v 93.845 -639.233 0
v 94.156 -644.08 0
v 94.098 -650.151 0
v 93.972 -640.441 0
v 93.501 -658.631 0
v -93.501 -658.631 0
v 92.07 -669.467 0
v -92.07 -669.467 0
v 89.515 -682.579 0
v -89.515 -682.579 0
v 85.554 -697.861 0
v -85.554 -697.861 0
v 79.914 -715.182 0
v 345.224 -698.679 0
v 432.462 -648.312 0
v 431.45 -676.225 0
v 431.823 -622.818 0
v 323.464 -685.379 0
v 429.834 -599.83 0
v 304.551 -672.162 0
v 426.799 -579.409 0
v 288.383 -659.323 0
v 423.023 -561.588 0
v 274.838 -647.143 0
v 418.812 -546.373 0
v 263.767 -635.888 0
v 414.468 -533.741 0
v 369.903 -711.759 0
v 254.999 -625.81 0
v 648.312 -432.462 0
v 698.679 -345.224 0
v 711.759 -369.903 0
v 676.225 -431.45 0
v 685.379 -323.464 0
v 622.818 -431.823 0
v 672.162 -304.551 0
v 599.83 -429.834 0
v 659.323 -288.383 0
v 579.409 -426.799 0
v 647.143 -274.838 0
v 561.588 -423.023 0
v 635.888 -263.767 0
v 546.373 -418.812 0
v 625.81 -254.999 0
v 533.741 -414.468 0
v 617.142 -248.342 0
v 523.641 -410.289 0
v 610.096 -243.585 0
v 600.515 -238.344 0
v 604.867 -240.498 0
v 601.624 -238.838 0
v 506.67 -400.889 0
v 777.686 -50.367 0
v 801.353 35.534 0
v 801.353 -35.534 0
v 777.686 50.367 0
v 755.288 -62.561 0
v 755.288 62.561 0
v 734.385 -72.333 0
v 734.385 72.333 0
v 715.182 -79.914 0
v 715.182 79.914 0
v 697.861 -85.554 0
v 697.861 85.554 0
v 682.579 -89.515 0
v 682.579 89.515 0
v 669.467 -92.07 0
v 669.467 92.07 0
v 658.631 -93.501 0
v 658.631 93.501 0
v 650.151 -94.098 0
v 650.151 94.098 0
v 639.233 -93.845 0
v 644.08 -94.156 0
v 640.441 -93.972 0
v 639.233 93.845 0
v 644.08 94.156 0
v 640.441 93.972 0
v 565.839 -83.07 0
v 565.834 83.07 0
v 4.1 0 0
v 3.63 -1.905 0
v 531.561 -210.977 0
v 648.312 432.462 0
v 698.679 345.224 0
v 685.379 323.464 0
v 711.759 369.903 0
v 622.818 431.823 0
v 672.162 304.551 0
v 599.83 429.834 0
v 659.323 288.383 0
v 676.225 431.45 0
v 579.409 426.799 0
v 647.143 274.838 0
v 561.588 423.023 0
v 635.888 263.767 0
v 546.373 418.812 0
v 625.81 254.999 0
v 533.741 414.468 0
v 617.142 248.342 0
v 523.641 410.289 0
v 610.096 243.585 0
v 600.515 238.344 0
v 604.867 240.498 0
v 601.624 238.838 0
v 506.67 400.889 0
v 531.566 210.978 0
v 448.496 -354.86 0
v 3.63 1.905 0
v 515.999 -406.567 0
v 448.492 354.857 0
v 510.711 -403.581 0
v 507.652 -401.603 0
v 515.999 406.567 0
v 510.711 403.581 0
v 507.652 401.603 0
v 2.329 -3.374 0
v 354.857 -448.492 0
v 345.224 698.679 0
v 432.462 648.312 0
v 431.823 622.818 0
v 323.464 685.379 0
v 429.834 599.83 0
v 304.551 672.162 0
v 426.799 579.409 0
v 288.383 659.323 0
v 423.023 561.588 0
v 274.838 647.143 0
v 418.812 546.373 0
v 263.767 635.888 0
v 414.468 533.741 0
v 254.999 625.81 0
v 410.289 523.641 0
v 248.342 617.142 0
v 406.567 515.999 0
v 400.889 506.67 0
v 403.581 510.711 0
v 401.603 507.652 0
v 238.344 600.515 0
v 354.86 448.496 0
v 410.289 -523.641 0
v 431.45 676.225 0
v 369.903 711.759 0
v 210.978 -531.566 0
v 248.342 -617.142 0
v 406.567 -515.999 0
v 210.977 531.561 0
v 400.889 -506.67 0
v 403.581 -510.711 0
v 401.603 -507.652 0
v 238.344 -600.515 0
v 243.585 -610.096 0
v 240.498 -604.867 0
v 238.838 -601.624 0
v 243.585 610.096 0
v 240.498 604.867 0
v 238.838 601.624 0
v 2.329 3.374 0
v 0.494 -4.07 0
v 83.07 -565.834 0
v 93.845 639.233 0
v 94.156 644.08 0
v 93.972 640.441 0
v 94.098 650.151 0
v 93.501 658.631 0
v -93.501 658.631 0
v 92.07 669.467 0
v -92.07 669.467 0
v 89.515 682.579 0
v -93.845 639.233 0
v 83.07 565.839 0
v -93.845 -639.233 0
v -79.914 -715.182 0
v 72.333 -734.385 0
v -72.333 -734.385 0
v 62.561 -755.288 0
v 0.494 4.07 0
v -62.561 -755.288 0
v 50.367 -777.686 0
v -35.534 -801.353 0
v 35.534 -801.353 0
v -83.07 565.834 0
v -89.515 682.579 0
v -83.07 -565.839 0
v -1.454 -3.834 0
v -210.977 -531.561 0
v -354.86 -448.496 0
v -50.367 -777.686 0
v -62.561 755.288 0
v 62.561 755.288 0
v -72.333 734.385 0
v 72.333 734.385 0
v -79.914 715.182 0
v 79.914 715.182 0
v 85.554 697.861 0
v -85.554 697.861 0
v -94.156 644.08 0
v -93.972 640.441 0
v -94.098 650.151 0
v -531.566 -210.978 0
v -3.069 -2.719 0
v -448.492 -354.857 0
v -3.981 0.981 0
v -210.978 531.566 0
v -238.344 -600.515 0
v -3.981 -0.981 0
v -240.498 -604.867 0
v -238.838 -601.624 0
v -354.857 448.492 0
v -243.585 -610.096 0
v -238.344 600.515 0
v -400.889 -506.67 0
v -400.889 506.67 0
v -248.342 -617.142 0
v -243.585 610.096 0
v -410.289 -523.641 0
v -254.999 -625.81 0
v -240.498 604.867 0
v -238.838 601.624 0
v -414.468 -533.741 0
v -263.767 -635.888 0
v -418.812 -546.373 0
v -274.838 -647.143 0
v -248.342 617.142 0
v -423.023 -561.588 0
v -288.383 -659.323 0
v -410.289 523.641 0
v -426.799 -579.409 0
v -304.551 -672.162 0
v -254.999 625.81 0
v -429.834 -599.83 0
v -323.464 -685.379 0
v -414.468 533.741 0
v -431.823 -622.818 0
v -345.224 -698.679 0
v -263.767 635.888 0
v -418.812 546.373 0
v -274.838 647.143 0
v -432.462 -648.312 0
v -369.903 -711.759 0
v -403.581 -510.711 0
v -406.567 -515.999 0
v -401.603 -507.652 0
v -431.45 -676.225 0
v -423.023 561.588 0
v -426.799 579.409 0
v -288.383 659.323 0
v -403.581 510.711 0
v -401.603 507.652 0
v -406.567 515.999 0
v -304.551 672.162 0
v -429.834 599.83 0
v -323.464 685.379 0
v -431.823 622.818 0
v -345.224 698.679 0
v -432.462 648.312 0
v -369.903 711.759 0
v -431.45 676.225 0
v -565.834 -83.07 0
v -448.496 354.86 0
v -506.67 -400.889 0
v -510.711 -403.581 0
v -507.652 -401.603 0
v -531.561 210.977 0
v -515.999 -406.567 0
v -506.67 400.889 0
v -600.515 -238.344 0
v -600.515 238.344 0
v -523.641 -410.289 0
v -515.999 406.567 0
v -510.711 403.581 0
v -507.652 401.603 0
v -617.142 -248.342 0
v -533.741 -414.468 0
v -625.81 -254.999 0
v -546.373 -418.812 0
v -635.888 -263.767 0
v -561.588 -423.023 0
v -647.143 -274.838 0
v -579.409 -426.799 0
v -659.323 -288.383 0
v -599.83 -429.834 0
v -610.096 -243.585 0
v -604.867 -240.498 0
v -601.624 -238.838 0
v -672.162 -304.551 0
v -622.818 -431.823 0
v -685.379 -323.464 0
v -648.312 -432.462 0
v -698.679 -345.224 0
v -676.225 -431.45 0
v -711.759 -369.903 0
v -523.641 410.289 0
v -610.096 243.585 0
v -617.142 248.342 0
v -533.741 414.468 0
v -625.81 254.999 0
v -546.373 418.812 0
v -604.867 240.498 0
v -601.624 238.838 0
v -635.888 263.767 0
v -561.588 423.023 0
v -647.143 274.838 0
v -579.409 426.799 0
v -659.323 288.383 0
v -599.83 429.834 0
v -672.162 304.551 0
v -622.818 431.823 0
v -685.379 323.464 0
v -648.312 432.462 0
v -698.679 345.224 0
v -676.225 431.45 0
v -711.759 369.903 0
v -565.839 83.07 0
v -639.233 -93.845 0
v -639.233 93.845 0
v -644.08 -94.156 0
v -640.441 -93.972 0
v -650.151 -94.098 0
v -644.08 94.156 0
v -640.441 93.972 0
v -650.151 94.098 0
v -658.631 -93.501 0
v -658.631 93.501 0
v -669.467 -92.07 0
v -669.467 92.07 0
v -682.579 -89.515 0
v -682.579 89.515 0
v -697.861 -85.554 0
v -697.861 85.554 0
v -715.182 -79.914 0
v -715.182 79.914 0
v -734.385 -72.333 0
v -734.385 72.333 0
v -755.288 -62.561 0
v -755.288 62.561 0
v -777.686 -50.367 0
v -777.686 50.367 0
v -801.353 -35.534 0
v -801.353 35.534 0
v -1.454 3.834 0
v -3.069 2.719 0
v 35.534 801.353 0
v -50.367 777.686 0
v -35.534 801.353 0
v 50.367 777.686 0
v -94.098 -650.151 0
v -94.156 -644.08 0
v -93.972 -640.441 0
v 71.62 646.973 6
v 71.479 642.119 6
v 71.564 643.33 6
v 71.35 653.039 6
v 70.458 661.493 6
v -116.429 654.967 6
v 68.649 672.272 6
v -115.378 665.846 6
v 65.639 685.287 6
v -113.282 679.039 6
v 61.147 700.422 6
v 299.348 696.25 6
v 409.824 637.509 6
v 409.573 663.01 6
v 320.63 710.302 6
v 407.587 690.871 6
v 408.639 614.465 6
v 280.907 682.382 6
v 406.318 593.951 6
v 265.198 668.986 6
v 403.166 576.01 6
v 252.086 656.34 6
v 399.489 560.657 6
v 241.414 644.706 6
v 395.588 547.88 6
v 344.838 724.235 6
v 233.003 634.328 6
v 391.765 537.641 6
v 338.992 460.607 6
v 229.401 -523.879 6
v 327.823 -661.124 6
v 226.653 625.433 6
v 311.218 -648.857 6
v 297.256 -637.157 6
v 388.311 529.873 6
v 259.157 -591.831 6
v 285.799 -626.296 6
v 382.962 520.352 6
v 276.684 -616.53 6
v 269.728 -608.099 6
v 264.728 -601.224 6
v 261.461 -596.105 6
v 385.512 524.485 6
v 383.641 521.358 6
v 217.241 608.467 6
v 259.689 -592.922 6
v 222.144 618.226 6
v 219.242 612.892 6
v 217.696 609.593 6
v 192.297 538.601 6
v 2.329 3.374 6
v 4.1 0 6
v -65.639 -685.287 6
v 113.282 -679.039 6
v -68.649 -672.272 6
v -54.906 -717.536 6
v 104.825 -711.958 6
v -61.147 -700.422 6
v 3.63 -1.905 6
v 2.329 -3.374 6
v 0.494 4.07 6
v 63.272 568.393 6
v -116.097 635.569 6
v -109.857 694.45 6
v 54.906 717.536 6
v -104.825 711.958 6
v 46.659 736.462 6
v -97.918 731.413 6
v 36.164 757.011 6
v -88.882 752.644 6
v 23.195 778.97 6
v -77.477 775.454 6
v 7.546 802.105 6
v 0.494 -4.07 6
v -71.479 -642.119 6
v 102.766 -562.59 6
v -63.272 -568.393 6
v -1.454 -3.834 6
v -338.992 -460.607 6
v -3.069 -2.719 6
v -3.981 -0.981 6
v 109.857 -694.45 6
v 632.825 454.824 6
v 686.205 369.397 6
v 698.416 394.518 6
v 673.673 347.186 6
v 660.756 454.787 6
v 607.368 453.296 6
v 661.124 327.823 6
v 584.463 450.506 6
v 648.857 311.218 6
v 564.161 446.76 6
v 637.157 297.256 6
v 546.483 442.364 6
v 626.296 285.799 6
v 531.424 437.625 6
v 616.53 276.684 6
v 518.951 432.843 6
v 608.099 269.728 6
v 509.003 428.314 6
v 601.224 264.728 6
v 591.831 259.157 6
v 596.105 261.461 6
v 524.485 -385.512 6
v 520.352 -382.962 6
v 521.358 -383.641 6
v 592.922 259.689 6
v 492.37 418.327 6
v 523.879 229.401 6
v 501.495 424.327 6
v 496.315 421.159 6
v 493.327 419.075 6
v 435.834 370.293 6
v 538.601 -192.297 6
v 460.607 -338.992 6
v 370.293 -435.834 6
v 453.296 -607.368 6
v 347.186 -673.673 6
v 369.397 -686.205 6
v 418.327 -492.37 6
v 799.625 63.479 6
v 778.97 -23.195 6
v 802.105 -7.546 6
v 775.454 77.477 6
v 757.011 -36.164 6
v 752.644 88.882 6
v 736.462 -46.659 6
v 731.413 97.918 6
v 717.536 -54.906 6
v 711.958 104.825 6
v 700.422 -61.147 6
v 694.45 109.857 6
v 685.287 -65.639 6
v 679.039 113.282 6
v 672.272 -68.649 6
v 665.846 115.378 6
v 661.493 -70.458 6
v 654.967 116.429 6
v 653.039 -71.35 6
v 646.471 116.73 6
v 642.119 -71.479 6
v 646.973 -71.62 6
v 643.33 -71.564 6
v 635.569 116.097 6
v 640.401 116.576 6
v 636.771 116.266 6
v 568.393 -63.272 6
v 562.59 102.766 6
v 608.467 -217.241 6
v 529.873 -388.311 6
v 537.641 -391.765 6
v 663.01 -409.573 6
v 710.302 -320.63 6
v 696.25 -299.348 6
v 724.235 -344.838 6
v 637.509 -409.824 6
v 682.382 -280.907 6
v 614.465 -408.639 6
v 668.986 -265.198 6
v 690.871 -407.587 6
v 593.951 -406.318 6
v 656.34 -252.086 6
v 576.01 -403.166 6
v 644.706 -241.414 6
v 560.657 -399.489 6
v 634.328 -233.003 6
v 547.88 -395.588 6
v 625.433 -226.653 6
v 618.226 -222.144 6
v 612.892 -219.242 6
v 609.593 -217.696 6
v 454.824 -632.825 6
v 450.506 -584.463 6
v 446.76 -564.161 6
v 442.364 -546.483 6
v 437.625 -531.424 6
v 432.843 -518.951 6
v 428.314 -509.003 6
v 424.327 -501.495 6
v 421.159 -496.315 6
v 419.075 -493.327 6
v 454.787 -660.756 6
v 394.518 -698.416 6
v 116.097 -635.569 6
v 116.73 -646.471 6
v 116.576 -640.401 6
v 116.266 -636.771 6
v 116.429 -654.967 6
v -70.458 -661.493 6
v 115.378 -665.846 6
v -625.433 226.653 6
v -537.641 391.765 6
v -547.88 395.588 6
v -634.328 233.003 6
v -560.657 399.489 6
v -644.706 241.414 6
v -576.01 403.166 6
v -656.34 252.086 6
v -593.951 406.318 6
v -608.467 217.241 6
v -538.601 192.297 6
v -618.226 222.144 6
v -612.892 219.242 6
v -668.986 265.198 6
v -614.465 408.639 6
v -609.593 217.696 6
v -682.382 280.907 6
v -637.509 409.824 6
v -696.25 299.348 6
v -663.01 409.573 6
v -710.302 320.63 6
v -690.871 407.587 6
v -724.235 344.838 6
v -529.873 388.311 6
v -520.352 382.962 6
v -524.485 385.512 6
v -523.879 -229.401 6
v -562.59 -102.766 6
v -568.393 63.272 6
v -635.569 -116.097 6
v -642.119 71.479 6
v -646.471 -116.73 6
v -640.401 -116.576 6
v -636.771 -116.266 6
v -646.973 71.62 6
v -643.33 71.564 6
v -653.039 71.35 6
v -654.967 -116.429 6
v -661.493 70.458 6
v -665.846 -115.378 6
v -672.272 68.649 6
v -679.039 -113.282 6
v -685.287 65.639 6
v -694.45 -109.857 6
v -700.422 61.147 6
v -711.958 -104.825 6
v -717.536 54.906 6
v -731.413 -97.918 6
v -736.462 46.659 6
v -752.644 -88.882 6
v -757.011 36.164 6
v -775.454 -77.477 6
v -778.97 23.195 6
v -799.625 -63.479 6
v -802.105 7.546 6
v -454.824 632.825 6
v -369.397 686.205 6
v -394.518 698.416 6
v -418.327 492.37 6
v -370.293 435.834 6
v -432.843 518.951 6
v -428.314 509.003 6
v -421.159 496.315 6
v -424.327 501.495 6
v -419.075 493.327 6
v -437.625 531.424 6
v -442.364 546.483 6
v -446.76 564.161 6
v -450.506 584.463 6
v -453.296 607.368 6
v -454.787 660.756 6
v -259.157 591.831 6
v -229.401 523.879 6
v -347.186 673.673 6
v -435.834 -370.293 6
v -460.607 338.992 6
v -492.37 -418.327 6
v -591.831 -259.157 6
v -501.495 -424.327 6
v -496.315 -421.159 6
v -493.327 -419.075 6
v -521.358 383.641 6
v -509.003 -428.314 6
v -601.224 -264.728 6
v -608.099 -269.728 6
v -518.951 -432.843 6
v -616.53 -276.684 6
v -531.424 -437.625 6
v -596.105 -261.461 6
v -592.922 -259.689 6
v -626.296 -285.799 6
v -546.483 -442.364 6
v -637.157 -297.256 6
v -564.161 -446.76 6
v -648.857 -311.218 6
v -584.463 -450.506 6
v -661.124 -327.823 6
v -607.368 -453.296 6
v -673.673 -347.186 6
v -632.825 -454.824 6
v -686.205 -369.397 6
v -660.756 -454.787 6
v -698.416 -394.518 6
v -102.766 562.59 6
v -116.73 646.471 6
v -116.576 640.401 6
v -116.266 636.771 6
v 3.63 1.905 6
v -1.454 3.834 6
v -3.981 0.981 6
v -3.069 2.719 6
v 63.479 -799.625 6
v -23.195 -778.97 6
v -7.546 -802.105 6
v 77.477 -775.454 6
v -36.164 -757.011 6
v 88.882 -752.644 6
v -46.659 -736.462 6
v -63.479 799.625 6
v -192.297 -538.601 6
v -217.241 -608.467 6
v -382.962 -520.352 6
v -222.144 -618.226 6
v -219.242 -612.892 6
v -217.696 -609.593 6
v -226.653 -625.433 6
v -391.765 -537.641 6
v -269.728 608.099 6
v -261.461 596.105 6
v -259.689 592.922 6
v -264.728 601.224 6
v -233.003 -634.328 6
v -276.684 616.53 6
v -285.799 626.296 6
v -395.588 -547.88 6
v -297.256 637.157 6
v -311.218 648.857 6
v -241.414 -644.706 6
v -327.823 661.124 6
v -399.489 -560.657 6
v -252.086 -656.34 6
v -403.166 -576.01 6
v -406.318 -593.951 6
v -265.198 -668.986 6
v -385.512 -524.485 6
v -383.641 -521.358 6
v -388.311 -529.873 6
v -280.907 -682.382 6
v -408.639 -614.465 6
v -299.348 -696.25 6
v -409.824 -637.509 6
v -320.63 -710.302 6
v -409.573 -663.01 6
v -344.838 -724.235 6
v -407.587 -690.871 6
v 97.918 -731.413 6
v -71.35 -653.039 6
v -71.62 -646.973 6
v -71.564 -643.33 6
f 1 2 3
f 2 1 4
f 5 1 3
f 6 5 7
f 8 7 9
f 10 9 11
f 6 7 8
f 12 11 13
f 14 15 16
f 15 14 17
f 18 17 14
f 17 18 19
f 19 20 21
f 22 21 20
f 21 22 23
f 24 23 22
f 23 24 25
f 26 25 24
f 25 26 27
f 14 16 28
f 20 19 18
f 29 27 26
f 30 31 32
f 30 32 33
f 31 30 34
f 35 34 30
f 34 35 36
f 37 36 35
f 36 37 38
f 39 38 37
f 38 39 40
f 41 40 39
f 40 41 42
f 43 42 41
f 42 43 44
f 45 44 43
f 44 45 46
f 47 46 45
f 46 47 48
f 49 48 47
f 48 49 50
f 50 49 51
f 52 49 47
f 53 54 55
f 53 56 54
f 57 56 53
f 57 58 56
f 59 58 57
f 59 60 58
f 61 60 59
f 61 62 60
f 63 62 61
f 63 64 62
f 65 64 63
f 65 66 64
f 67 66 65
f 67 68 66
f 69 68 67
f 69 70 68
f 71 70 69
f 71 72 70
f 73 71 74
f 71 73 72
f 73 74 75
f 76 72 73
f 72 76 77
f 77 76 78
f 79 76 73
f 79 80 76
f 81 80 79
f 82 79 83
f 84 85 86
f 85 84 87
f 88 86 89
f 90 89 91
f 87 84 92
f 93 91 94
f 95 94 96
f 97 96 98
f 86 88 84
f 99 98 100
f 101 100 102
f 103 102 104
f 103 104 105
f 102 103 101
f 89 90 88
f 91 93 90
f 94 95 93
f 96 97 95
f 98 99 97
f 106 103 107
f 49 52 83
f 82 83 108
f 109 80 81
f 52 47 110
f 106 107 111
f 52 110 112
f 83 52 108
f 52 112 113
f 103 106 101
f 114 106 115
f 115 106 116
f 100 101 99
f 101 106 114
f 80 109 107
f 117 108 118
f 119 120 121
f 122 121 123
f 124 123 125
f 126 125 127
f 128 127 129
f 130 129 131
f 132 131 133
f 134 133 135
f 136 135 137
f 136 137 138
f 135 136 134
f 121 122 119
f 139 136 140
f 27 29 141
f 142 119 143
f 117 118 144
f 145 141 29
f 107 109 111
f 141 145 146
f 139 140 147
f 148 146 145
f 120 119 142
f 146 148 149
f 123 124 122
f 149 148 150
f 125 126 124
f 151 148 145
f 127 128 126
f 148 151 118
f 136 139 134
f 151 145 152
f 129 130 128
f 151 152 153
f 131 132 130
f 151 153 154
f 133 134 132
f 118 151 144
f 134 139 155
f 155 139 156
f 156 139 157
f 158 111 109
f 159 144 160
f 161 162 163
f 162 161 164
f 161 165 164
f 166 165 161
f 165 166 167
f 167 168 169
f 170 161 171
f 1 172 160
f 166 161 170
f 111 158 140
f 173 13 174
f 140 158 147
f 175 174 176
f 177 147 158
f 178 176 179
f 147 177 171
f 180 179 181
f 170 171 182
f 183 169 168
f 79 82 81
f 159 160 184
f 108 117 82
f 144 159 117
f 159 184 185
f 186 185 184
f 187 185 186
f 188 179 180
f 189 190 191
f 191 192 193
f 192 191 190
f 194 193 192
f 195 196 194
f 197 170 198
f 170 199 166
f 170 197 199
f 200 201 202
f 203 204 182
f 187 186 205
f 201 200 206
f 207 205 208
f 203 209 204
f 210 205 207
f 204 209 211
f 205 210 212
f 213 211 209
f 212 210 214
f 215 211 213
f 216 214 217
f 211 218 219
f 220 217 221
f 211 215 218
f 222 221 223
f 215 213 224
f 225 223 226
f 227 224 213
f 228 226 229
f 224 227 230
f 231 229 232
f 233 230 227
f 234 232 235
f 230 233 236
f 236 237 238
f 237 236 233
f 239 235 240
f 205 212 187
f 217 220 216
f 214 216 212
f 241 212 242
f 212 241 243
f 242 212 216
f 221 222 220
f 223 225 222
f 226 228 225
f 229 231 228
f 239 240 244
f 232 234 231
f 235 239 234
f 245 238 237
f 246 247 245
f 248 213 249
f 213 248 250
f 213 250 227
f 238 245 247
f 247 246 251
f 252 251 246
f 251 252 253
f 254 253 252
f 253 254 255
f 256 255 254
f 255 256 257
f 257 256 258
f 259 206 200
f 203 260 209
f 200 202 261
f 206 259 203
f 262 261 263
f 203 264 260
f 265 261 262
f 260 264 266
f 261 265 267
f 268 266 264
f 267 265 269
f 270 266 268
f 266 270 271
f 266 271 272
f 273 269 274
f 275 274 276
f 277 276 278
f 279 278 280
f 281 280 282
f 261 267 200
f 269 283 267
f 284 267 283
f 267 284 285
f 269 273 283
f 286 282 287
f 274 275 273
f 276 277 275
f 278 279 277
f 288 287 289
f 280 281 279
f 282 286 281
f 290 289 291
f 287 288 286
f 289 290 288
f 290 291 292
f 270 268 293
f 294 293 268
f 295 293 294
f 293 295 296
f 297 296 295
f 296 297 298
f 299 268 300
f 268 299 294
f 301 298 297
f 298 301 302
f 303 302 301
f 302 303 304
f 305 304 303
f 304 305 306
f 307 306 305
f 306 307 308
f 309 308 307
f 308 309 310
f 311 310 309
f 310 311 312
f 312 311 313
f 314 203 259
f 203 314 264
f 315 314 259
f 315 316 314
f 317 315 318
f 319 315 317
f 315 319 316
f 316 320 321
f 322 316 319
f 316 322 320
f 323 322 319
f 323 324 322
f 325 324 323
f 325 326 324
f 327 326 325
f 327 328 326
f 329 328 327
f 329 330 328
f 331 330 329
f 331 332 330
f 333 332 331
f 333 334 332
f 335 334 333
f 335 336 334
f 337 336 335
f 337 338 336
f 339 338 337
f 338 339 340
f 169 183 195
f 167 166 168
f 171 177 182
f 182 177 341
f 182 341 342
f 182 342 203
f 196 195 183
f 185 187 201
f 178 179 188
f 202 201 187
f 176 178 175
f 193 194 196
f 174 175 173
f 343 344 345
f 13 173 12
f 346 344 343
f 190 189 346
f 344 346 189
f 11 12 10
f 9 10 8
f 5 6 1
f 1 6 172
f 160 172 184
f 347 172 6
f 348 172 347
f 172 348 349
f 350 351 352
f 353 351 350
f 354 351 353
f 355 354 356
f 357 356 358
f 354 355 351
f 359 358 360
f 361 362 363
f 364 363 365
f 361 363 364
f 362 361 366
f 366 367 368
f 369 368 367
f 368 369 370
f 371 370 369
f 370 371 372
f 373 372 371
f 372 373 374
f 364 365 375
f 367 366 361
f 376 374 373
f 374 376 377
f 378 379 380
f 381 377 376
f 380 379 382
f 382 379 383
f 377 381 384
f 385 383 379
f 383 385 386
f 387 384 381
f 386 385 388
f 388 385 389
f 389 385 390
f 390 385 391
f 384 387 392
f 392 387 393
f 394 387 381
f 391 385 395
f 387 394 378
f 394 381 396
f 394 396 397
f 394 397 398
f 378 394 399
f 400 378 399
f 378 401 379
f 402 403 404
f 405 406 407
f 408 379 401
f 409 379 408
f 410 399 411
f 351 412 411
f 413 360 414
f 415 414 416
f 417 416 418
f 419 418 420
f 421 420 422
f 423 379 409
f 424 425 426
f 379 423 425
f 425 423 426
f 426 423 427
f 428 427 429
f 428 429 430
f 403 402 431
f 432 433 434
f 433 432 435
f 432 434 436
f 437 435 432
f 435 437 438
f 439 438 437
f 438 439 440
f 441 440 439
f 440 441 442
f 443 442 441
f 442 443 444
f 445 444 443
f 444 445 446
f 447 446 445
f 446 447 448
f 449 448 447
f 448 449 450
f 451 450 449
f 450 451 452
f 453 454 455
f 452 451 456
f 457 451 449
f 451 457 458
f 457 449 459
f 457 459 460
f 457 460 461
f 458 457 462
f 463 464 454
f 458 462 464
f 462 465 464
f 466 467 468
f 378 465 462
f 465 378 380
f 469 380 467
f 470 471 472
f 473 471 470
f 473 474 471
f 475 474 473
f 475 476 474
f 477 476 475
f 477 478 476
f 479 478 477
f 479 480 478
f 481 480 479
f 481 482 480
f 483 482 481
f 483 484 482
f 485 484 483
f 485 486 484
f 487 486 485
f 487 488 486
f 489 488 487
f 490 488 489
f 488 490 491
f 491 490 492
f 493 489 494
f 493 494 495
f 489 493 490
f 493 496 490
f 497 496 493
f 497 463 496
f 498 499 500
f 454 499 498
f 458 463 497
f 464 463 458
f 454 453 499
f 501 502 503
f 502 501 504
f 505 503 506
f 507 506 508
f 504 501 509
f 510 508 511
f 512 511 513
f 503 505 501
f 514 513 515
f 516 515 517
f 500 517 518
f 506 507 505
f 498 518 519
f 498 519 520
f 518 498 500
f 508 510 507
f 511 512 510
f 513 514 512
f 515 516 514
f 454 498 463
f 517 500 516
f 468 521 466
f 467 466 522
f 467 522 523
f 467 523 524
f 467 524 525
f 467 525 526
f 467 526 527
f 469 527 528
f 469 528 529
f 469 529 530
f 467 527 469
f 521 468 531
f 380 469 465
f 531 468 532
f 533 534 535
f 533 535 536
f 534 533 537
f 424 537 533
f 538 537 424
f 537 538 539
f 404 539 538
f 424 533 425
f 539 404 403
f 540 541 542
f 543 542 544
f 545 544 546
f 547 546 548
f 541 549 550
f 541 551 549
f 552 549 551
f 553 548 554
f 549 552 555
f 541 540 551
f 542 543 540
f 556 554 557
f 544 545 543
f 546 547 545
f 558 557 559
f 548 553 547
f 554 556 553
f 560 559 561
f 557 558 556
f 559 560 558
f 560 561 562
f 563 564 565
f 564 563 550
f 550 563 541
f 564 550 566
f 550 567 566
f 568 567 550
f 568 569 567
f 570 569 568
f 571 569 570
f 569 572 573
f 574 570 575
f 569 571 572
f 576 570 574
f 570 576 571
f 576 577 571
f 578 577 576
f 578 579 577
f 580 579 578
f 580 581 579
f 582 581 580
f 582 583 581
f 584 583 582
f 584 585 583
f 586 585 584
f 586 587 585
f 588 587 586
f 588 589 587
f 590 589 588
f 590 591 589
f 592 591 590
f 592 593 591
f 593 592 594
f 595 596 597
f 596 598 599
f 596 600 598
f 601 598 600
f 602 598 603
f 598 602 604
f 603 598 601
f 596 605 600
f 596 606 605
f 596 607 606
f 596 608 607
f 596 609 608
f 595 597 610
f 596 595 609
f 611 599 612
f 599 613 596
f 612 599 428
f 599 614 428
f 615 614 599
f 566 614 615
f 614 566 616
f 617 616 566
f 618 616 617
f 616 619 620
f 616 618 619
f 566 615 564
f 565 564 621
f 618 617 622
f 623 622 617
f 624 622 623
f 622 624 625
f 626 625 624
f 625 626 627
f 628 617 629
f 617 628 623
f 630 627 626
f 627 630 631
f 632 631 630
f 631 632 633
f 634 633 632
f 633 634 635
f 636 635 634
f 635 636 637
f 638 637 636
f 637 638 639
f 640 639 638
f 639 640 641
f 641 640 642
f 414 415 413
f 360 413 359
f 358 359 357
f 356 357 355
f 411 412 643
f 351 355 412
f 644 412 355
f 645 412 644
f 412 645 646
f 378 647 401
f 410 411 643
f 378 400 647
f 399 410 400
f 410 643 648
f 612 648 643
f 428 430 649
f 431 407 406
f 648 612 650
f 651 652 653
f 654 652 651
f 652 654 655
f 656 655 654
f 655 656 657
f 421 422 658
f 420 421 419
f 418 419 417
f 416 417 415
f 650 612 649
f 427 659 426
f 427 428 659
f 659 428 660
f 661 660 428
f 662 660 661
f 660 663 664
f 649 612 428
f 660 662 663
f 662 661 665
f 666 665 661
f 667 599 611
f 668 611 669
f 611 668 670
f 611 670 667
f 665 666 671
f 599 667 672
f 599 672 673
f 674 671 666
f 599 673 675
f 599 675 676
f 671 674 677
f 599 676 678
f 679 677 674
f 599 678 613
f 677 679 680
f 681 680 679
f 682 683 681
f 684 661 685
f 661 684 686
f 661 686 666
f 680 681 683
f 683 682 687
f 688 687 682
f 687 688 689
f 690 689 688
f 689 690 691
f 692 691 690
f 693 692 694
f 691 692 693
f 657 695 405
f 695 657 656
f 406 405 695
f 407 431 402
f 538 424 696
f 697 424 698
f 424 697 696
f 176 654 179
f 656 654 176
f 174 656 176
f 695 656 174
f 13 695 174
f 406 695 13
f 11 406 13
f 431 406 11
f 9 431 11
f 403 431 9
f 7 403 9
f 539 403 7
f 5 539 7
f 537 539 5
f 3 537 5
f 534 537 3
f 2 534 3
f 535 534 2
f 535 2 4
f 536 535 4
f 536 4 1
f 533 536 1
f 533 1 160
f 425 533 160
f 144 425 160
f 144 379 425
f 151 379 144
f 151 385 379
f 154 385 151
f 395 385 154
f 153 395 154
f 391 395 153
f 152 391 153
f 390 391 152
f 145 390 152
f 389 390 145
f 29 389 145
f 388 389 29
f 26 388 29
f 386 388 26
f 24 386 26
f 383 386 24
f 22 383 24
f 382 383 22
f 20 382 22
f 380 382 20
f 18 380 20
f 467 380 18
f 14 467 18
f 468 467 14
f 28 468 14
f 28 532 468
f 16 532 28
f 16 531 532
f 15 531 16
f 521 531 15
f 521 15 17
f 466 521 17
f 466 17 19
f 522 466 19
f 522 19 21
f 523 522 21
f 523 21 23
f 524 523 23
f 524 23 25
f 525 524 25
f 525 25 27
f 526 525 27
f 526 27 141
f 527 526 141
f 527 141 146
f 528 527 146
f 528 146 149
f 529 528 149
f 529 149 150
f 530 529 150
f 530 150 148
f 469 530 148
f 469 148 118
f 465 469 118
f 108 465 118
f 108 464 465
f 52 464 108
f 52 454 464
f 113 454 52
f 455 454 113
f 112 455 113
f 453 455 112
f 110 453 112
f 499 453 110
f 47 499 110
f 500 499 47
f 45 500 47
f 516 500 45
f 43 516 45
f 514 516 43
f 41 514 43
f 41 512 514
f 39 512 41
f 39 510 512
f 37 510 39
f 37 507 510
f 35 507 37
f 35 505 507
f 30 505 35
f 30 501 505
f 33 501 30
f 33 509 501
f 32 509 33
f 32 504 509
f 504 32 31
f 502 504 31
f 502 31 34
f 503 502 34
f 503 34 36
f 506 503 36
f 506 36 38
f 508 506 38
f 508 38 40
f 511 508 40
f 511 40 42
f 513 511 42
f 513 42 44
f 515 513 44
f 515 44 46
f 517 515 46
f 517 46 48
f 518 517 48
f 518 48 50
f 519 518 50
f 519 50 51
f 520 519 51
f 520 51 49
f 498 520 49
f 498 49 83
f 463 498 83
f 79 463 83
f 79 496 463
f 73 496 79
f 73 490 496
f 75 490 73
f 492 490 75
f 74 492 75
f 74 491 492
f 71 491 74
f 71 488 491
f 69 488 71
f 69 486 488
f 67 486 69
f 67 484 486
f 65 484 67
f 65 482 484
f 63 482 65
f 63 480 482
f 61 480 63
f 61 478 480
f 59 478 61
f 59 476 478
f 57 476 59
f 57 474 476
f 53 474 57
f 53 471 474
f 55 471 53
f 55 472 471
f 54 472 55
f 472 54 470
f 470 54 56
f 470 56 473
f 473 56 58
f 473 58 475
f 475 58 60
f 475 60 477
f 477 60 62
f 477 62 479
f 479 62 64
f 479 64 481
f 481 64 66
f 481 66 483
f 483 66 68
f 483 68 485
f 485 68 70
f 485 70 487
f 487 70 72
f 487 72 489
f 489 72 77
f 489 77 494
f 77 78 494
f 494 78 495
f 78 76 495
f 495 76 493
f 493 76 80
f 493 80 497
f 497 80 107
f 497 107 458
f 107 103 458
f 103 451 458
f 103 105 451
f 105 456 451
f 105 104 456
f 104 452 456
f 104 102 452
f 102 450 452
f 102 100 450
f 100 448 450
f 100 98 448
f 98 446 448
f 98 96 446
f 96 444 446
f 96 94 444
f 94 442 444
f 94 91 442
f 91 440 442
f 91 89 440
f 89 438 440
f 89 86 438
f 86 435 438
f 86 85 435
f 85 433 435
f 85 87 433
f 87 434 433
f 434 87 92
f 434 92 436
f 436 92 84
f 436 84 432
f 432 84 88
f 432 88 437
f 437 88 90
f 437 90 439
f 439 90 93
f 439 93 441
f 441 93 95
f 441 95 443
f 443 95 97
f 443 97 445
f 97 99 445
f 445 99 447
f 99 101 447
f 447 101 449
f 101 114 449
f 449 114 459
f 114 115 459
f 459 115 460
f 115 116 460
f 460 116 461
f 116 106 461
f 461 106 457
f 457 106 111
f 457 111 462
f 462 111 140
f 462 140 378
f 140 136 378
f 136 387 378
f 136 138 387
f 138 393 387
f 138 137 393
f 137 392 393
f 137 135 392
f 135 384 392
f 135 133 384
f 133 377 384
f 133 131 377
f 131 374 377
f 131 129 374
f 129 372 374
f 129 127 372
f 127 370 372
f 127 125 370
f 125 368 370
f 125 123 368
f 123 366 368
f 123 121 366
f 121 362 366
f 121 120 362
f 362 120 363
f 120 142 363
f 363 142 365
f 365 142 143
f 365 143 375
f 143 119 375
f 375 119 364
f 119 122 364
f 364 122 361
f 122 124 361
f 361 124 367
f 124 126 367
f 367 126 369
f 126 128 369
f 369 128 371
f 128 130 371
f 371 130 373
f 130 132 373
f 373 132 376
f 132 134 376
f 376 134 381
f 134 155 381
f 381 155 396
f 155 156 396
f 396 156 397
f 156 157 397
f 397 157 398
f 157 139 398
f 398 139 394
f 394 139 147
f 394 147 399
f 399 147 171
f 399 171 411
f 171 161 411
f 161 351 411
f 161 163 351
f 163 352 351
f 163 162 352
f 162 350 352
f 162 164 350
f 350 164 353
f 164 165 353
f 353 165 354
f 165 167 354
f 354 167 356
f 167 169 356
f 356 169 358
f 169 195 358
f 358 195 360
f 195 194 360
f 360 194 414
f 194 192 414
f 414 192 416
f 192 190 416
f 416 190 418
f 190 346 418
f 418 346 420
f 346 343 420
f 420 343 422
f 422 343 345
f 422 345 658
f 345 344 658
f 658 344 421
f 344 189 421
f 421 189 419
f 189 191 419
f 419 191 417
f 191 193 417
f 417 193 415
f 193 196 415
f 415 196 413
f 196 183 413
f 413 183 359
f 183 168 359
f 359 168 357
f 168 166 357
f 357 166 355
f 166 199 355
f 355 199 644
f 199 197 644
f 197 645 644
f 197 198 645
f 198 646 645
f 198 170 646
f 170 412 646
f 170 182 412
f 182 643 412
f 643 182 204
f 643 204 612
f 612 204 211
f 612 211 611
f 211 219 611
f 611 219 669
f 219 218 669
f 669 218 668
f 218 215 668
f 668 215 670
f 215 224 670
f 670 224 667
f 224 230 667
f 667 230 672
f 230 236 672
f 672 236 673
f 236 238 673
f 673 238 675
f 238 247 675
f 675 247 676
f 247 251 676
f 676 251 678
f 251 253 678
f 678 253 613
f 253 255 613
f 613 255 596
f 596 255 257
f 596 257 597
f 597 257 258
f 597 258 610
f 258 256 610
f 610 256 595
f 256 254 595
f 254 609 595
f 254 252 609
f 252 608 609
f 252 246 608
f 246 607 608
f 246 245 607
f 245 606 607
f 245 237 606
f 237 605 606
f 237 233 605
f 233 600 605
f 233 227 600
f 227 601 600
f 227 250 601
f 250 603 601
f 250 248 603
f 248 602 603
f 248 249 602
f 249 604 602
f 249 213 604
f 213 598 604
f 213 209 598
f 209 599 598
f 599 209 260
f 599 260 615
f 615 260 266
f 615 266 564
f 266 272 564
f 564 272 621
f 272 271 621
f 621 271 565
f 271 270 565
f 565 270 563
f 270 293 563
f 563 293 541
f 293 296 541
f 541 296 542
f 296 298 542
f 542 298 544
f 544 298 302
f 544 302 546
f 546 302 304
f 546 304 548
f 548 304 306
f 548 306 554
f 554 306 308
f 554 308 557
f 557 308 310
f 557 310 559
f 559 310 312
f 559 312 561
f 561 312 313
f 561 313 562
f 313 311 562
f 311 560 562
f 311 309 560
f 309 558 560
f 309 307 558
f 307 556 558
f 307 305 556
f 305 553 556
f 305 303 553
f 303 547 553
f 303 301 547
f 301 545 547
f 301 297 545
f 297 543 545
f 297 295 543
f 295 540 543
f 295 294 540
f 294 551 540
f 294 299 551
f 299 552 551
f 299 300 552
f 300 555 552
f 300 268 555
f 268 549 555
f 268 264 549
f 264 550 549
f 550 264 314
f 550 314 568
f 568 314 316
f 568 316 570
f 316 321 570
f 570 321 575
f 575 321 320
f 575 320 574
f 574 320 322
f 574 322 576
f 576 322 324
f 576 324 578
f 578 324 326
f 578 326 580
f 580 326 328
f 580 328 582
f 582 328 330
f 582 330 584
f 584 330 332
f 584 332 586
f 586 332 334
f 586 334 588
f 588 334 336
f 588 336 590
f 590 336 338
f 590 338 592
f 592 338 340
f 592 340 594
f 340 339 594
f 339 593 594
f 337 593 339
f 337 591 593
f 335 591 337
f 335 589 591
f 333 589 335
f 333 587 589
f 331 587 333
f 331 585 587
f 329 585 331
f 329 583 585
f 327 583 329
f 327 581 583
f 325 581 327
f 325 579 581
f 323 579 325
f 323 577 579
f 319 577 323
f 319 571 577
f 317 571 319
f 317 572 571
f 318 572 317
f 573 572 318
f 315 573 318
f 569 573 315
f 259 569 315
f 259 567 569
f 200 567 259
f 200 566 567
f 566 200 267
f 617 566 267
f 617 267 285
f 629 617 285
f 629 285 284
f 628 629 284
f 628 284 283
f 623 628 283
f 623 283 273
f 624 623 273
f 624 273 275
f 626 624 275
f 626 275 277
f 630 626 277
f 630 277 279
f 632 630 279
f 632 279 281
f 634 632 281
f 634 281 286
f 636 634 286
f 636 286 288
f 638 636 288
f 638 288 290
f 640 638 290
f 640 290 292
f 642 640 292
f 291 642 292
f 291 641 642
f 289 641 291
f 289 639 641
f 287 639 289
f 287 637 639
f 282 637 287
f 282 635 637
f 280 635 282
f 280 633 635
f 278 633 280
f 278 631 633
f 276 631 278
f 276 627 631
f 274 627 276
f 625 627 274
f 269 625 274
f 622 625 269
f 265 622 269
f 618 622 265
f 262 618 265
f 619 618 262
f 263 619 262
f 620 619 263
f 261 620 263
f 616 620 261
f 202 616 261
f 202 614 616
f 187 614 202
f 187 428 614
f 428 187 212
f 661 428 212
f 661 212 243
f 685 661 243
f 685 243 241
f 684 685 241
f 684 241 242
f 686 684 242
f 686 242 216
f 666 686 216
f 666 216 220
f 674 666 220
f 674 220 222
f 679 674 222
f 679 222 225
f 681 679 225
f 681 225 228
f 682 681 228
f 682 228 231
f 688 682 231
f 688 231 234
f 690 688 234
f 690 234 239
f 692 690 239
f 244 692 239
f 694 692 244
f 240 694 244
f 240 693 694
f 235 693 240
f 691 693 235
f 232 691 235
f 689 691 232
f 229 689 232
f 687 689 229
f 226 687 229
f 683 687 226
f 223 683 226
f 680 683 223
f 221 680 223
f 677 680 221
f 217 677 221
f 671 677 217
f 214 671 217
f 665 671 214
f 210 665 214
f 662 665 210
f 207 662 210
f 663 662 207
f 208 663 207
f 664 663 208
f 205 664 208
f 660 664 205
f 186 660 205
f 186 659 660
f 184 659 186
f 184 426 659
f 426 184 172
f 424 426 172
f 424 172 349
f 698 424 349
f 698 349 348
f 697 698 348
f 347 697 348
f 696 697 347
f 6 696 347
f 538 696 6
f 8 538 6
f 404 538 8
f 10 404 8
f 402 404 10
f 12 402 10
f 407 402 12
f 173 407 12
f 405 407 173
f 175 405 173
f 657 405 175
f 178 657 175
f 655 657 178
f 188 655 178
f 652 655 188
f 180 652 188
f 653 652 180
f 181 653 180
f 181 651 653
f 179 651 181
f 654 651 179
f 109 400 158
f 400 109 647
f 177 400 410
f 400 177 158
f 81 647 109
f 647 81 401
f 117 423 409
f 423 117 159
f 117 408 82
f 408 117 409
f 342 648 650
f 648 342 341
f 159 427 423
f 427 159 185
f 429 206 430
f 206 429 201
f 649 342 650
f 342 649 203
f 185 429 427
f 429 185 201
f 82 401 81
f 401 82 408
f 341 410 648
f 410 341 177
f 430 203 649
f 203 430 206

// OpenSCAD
use <original/Thingiverse-Projects/Threaded Library/Thread_Library.scad>
use <original/MCAD/involute_gears.scad>

numberTeeth=12;
pitchRadius=12;
thickness=6;


length=34;
radius=6;
pitch=2*3.1415*pitchRadius/numberTeeth;

angle=-360*$t;
offset=6;

distance=radius+pitchRadius+0.0*pitch;


gear ( 
	number_of_teeth=numberTeeth,
	circular_pitch=360*pitchRadius/numberTeeth,
	pressure_angle=20,
	clearance = 0,
	gear_thickness=thickness,
	rim_thickness=thickness,
	rim_width=5,
	hub_thickness=thickness,
	hub_diameter=8,
	bore_diameter=8.2,
	circles=0,
	backlash=0.1,
	twist=-pitchRadius/radius,
	involute_facets=12,
	flat=false);
